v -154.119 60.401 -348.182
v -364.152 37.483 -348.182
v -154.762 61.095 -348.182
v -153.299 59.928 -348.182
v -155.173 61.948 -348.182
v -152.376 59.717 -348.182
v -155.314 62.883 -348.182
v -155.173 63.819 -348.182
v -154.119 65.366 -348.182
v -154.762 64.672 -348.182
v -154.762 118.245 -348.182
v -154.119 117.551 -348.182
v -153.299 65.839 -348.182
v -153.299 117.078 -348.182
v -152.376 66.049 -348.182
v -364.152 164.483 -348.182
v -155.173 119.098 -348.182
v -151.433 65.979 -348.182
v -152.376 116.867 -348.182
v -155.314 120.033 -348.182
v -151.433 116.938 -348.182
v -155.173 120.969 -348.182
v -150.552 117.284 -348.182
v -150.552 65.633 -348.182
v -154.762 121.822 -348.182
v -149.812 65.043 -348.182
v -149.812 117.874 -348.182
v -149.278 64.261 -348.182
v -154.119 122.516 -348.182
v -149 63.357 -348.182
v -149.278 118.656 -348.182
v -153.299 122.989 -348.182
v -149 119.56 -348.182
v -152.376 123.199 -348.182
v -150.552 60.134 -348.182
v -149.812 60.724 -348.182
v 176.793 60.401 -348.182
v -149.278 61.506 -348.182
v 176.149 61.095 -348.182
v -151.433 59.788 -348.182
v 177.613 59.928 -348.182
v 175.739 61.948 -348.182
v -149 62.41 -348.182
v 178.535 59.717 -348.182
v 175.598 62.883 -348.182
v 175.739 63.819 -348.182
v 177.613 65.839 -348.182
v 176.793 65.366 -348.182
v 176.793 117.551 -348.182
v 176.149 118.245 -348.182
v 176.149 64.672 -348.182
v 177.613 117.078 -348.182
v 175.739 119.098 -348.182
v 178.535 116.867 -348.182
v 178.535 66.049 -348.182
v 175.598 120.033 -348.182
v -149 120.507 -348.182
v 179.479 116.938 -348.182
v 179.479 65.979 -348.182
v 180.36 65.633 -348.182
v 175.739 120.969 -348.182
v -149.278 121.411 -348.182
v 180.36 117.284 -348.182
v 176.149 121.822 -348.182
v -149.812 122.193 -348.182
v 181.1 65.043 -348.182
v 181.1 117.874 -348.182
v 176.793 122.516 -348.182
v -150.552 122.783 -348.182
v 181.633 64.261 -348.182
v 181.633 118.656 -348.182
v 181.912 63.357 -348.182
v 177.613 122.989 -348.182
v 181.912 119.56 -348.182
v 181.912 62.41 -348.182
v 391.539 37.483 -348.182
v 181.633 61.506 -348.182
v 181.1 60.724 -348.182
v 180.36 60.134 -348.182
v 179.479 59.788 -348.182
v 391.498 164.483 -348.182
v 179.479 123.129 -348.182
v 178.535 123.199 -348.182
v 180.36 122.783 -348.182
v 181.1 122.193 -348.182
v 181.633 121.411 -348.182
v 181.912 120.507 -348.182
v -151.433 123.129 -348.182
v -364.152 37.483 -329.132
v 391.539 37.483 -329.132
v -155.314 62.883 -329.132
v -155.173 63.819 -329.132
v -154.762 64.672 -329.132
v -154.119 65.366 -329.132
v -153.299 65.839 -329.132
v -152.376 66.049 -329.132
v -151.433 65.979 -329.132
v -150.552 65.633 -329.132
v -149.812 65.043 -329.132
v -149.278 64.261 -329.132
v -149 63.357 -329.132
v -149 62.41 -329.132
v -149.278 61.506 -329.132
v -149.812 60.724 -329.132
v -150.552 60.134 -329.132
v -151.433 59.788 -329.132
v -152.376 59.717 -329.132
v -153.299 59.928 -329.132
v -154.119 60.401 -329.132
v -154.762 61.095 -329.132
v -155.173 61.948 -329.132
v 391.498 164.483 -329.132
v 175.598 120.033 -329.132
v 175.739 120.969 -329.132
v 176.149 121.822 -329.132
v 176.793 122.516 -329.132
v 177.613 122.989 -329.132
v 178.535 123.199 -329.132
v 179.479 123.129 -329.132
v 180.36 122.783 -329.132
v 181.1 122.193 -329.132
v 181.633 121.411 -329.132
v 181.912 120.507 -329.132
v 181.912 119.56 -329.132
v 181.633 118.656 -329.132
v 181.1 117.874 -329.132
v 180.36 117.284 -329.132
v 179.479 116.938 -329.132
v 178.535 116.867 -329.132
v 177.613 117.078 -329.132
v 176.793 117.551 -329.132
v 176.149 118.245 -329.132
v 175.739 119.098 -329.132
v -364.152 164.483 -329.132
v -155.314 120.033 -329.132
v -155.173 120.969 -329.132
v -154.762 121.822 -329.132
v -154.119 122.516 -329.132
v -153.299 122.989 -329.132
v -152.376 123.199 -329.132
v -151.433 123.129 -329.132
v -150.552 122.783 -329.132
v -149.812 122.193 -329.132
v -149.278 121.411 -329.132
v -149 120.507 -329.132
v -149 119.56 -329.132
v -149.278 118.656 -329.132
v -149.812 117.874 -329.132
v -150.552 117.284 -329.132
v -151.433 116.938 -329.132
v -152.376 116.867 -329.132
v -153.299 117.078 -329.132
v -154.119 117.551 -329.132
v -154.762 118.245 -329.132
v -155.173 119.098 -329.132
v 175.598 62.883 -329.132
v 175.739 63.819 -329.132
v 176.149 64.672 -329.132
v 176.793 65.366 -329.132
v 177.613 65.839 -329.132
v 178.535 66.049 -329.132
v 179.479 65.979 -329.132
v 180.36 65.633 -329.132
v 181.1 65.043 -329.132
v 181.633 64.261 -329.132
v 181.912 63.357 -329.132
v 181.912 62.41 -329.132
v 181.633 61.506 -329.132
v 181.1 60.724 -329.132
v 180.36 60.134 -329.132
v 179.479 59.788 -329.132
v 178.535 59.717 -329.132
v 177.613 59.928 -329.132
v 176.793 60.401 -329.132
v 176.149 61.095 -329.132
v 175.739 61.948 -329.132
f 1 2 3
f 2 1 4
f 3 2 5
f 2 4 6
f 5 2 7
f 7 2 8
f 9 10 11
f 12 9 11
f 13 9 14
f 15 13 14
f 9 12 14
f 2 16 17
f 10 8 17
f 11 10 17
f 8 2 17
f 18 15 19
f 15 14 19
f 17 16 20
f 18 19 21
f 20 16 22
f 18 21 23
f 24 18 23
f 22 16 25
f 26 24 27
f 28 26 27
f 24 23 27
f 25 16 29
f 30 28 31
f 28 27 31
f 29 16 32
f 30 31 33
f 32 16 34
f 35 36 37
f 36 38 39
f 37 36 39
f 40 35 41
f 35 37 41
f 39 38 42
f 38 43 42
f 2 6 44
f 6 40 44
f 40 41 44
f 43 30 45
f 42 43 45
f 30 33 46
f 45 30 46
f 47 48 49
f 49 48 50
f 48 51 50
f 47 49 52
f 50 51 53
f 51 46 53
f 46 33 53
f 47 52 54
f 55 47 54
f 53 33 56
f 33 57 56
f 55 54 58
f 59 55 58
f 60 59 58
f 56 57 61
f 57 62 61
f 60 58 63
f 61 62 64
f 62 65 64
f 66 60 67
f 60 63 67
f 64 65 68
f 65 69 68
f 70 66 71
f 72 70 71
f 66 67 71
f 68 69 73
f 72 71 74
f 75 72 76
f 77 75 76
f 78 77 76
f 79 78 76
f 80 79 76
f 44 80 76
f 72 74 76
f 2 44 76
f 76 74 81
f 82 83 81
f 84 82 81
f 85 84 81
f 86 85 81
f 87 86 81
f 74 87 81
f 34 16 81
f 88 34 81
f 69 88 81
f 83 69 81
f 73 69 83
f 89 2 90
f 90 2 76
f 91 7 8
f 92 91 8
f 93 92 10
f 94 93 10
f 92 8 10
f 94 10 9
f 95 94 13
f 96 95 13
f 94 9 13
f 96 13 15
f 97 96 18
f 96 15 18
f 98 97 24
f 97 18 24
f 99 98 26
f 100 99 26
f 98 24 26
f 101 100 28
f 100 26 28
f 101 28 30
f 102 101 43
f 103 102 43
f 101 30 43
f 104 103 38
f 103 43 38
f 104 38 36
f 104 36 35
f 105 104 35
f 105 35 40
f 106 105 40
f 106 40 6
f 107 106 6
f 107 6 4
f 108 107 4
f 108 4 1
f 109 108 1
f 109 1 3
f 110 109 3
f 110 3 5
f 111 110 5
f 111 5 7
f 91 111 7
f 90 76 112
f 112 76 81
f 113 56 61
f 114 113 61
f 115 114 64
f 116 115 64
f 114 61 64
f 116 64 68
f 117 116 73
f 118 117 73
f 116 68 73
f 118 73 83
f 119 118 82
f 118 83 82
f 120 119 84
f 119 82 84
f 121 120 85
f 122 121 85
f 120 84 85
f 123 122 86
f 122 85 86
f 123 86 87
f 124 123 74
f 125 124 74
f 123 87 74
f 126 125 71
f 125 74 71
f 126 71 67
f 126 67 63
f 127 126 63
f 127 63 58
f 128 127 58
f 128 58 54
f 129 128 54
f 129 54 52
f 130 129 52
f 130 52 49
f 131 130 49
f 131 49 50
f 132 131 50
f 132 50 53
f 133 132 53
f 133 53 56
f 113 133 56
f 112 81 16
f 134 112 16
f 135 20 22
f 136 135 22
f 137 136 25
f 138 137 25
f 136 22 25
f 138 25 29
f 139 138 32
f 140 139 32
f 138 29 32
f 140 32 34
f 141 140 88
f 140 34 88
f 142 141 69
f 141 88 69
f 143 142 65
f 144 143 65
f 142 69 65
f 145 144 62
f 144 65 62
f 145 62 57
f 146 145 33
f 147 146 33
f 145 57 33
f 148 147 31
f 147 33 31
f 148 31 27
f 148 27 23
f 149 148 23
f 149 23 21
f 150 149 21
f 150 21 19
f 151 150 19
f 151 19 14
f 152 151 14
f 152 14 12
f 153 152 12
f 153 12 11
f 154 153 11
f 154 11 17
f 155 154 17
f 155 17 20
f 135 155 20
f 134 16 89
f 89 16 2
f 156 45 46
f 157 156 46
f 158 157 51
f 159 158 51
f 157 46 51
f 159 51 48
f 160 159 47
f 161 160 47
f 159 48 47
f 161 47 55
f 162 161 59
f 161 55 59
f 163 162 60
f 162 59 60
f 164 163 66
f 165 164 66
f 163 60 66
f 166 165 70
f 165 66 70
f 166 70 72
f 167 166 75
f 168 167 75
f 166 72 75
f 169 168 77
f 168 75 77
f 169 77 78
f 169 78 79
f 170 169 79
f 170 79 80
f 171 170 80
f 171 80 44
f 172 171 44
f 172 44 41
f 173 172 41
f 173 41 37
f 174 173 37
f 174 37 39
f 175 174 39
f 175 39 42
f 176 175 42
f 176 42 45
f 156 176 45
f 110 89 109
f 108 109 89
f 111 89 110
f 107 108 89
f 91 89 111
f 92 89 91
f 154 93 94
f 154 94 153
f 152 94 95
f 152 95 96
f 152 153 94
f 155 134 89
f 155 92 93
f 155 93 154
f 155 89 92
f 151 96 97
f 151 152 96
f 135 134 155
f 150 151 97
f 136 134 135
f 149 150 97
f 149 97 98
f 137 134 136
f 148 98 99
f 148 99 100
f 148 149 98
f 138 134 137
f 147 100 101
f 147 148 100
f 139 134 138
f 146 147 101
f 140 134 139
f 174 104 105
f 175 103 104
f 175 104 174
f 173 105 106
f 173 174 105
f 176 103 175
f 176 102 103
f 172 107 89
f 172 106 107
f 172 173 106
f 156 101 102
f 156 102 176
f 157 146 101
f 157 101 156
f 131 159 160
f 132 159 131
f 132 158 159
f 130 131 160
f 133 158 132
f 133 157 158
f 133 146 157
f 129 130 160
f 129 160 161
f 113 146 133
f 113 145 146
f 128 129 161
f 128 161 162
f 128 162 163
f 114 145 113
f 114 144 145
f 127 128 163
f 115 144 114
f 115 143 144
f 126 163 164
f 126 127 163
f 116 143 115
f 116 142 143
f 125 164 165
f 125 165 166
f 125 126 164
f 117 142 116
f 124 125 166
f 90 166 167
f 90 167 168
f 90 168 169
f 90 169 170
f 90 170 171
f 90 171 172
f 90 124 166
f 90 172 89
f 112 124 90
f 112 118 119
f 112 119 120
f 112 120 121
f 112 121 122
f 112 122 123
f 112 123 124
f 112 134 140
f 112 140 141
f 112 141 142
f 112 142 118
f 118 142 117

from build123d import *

# Parameters (mm, degrees)
BOSS_EXTRUDE1_DEPTH         = 19.05
F_1_4_0_25_DIAMETER_HOLE1_D = 6.35


with BuildPart() as part:
    # Sketch1 → Boss-Extrude1 (new body)
    with BuildSketch(Plane.XY.offset(-348.182458287)):
        Polygon((391.497753528, 164.483362877), (-364.152246472, 164.483362877), (-364.152246472, 37.483362877), (391.538596905, 37.483362877), align=None)
    extrude(amount=BOSS_EXTRUDE1_DEPTH)

    # 1/4 (0.25) Diameter Hole1 (through all)
    with Locations(Plane.XY.offset(-329.132458287)):
        with Locations((-152.13904646, 120.033362877), (-152.13904646, 62.883362877), (178.772753528, 62.883362877), (178.772753528, 120.033362877)):
            Hole(F_1_4_0_25_DIAMETER_HOLE1_D / 2)


solid = part.part
